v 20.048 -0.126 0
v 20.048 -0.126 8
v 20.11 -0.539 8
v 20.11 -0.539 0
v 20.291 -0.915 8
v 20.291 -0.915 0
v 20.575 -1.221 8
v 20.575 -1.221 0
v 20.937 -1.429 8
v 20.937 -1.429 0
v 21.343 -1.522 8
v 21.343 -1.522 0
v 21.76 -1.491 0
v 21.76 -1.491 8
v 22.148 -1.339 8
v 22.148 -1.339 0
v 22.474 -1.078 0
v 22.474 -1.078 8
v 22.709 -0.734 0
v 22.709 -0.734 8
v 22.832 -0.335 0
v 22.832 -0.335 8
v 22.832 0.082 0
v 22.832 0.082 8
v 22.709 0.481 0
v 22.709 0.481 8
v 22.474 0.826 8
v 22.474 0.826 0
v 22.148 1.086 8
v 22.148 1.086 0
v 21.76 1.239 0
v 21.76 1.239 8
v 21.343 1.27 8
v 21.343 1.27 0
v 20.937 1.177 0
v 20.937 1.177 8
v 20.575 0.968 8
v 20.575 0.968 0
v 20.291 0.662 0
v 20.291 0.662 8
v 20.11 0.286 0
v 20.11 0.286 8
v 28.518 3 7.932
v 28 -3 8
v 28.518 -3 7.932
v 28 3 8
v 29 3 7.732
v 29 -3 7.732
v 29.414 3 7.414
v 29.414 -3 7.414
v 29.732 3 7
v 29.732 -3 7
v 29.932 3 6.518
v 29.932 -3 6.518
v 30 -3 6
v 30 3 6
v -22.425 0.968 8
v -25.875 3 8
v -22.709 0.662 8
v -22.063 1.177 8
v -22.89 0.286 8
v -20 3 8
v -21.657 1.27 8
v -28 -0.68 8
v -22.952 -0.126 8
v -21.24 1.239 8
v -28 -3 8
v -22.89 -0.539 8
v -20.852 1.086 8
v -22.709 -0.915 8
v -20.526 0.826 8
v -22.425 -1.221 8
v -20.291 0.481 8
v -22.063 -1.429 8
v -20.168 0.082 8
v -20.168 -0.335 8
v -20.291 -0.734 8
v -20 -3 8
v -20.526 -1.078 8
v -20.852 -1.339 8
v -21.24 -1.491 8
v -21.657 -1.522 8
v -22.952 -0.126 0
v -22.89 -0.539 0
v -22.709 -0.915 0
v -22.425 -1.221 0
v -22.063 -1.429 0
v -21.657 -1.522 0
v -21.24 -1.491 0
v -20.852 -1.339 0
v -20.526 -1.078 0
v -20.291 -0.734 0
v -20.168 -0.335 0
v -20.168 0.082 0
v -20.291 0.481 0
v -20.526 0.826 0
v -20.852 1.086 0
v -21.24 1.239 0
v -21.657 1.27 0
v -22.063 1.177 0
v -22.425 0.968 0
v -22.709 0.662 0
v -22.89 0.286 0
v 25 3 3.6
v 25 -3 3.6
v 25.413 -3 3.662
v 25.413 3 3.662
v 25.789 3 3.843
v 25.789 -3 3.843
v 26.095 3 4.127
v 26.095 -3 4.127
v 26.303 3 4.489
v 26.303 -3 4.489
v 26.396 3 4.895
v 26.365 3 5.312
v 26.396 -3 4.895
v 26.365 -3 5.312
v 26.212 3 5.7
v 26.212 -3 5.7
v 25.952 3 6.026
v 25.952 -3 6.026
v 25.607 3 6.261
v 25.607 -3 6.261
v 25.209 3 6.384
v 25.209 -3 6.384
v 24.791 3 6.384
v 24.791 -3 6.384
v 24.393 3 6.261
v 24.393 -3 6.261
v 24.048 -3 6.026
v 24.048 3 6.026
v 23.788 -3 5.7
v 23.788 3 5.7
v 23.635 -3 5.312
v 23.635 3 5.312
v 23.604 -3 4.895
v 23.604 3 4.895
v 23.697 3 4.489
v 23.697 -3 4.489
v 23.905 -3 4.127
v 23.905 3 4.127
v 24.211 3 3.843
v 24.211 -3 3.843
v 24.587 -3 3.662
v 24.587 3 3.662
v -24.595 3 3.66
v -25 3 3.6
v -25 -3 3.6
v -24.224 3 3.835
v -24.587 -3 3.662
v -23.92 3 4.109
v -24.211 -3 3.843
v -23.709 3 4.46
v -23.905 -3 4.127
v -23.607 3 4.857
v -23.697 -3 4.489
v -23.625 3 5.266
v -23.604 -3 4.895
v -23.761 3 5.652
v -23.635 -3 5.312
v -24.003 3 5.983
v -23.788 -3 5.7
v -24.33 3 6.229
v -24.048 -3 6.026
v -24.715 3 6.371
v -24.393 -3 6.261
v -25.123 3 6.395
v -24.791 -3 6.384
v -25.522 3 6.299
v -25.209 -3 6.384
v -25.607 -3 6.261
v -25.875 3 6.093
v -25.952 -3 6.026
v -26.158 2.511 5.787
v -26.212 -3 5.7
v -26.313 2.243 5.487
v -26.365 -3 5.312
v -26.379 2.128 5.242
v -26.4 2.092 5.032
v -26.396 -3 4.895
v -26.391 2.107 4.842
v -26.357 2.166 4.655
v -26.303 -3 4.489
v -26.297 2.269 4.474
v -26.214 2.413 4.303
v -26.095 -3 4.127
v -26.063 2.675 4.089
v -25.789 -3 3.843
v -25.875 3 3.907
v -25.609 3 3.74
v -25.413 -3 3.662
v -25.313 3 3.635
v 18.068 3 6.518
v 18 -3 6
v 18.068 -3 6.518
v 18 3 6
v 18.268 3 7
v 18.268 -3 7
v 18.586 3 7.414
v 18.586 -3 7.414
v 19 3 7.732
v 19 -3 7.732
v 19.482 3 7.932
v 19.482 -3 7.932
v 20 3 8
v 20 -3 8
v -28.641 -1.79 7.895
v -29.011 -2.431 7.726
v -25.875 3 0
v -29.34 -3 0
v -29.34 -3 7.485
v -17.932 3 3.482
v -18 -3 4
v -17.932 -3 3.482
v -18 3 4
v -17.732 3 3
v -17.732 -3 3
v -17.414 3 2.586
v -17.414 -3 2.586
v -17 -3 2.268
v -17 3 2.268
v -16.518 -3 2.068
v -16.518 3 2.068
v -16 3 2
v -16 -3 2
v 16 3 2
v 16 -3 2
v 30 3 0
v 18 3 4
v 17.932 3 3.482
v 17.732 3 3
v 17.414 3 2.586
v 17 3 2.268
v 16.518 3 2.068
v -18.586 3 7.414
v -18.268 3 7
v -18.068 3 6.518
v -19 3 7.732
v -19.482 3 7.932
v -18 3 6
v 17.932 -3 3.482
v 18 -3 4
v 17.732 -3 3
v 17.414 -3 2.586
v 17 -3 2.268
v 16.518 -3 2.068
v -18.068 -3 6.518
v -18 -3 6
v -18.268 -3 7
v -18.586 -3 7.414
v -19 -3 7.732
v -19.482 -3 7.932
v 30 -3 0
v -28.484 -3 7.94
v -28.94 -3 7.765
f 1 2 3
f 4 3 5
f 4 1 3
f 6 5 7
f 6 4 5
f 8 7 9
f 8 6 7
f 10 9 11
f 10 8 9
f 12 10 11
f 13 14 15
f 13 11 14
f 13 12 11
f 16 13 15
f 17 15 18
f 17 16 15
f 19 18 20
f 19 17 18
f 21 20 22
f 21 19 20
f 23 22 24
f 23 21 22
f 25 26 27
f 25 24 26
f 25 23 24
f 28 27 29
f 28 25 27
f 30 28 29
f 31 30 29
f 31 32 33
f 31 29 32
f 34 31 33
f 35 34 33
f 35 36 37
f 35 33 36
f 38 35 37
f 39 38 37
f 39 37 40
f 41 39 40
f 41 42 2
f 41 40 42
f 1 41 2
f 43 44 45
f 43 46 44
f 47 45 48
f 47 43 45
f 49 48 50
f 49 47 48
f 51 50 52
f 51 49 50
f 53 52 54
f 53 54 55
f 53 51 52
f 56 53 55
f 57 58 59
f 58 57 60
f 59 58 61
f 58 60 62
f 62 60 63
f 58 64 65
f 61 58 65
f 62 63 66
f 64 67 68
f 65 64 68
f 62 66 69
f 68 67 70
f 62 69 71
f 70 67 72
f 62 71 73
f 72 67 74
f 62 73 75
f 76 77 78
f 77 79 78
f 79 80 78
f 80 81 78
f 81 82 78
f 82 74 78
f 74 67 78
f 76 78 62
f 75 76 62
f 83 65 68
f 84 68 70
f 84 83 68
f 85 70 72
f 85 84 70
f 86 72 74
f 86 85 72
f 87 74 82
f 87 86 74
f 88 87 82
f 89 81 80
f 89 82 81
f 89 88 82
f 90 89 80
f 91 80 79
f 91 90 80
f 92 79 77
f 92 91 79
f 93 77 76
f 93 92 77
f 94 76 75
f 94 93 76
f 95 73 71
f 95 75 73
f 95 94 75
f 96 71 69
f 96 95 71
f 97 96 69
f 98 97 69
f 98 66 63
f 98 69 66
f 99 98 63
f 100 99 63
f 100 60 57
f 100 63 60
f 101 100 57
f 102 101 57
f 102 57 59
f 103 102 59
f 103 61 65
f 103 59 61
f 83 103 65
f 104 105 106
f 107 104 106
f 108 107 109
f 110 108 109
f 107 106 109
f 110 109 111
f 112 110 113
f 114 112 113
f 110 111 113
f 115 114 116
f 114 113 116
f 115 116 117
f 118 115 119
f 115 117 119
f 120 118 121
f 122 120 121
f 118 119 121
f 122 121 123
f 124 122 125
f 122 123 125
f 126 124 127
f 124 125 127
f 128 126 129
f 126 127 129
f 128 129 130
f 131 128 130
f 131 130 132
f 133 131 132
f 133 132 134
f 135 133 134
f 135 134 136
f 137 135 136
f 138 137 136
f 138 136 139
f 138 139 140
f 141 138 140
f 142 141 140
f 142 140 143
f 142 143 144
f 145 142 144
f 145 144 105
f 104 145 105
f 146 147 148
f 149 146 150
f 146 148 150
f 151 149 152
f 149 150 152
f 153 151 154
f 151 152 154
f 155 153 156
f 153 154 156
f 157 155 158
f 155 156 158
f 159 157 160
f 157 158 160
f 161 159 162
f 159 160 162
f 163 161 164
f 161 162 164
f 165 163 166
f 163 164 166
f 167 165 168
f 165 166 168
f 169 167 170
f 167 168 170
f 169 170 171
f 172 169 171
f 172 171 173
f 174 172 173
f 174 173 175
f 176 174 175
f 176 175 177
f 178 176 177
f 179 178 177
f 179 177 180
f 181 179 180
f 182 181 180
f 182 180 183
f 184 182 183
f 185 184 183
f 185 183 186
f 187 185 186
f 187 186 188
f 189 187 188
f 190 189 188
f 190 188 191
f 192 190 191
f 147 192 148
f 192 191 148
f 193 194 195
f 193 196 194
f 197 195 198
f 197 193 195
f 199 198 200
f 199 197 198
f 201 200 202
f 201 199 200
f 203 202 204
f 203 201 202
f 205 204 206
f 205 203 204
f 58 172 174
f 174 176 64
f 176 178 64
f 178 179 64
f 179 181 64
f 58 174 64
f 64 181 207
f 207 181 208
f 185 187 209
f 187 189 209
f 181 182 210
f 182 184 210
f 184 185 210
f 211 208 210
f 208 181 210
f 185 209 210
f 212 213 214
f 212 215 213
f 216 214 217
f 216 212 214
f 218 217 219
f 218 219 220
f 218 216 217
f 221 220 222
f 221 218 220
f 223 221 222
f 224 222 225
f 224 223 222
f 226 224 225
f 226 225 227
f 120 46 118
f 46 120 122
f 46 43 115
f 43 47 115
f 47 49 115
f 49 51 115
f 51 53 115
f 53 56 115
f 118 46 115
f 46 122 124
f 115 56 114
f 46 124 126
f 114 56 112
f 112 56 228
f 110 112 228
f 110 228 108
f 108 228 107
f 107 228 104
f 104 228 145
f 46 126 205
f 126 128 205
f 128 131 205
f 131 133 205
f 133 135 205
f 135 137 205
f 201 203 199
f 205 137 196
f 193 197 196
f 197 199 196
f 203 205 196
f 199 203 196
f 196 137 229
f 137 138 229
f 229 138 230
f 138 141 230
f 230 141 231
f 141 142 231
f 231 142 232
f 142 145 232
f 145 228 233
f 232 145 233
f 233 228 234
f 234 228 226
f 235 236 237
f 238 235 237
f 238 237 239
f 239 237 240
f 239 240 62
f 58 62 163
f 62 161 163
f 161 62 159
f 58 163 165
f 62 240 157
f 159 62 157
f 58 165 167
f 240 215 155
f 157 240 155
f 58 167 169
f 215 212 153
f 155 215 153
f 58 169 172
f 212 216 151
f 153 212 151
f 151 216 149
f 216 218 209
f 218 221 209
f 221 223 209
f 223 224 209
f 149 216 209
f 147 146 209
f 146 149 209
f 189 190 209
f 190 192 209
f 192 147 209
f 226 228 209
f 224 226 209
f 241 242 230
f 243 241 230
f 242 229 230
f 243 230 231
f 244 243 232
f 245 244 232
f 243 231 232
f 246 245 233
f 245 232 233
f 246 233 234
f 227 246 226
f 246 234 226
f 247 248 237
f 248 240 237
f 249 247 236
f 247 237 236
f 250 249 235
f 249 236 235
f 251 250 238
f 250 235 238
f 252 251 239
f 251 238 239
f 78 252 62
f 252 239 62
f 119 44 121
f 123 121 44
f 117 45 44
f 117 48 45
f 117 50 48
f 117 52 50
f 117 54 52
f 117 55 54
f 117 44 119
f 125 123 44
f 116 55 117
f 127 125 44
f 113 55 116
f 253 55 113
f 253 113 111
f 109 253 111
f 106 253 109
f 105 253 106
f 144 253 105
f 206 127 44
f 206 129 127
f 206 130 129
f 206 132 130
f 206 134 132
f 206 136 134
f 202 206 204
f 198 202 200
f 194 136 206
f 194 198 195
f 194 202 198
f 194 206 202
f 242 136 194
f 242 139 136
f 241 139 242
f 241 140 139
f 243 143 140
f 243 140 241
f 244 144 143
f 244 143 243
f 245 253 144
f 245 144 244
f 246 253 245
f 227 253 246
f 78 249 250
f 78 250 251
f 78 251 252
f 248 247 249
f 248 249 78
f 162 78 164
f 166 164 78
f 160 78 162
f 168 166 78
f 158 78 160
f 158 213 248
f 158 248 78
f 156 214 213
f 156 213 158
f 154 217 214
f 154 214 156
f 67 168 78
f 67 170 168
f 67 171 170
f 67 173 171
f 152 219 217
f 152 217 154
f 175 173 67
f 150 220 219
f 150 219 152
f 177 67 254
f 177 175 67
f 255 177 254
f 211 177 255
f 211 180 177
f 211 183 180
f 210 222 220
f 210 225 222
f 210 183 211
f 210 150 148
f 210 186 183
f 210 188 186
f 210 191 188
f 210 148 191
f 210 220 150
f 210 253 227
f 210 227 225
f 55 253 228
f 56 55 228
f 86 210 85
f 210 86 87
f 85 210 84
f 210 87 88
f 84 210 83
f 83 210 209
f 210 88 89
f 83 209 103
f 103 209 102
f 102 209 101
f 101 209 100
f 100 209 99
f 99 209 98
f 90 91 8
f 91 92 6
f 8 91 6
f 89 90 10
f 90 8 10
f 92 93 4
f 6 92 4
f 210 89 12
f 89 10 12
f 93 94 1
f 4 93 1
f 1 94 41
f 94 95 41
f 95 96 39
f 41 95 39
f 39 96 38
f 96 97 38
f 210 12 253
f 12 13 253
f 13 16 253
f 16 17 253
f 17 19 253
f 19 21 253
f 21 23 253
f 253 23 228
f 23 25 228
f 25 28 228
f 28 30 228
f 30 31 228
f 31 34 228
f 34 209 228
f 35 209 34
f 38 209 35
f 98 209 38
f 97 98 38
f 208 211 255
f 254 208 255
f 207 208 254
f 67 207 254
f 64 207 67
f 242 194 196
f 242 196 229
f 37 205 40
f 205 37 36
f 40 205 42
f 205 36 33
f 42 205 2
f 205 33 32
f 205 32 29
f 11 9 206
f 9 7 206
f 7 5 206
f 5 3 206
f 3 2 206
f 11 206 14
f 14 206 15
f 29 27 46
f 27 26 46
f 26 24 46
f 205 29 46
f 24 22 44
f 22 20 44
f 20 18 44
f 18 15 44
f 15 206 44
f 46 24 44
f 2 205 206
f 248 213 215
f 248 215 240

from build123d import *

# Parameters (mm, degrees)
SKETCH1_W           = 60
SKETCH1_H           = 6
BASE_DEPTH          = 2
BOSS_EXTRUDE2_DEPTH = 6
FILLET1_R           = 2
CROP_REACH          = 33.193
FAN_SCREWS_REACH    = 33.623
SKETCH5_R           = 1.4
PCB_SCREWS_REACH    = 33.193
SKETCH3_R           = 1.4


with BuildPart() as part:
    # Sketch1 → Base (new body)
    with BuildSketch(Plane.XY):
        Rectangle(SKETCH1_W, SKETCH1_H)
    extrude(amount=BASE_DEPTH)

    # Sketch4 → Boss-Extrude2 (add)
    with BuildSketch(Plane(origin=(0, -3, 0), x_dir=(1, 0, 0), z_dir=(0, 1, 0))):
        Polygon((-30, -2), (-18, -2), (-18, -8), (-25, -8), (-30, -8), align=None)
        Polygon((30, -2), (30, -8), (25, -8), (18, -8), (18, -2), align=None)
    extrude(amount=BOSS_EXTRUDE2_DEPTH)

    # Fillet1
    fillet1_edges = [part.edges().sort_by_distance(p)[0] for p in [
        (-18, 0, 2),
        (-18, 0, 8),
        (-30, 0, 8),
        (30, 0, 8),
        (18, 0, 8),
        (18, 0, 2),
    ]]
    fillet(fillet1_edges, radius=FILLET1_R)

    # Sketch2 → Crop (cut, up to next)
    with BuildSketch(Plane.XY, mode=Mode.PRIVATE) as crop_sk1:
        Polygon((-25.875432474, 3), (-29.339534089, -3), (-30, -3), (-30, 3), align=None)
    crop_tool1 = extrude(crop_sk1.sketch, amount=CROP_REACH, mode=Mode.PRIVATE) & part.part
    add(crop_tool1.solids().sort_by_distance((-28.594757, 0.723945, 0))[0], mode=Mode.SUBTRACT)

    # Sketch5 → Fan screws (cut, up to next)
    with BuildSketch(Plane.XZ.offset(3), mode=Mode.PRIVATE) as fan_screws_sk1:
        with Locations(Location((25, 5, 0), (0, 0, 270))):
            Circle(SKETCH5_R)
    fan_screws_tool1 = extrude(fan_screws_sk1.sketch, amount=-FAN_SCREWS_REACH, mode=Mode.PRIVATE) & part.part
    # Sketch5 → Fan screws (cut, up to next)
    with BuildSketch(Plane.XZ.offset(3), mode=Mode.PRIVATE) as fan_screws_sk2:
        with Locations(Location((-25, 5, 0), (0, 0, 270))):
            Circle(SKETCH5_R)
    fan_screws_tool2 = extrude(fan_screws_sk2.sketch, amount=-FAN_SCREWS_REACH, mode=Mode.PRIVATE) & part.part
    add(fan_screws_tool1.solids().sort_by_distance((25, -3, 5))[0], mode=Mode.SUBTRACT)
    add(fan_screws_tool2.solids().sort_by_distance((-25, -3, 5))[0], mode=Mode.SUBTRACT)

    # Sketch3 → PCB screws (cut, up to next)
    with BuildSketch(Plane.XY, mode=Mode.PRIVATE) as pcb_screws_sk1:
        with Locations(Location((21.448, -0.1262, 0), (0, 0, 180))):
            Circle(SKETCH3_R)
    pcb_screws_tool1 = extrude(pcb_screws_sk1.sketch, amount=PCB_SCREWS_REACH, mode=Mode.PRIVATE) & part.part
    # Sketch3 → PCB screws (cut, up to next)
    with BuildSketch(Plane.XY, mode=Mode.PRIVATE) as pcb_screws_sk2:
        with Locations(Location((-21.552, -0.1262, 0), (0, 0, 180))):
            Circle(SKETCH3_R)
    pcb_screws_tool2 = extrude(pcb_screws_sk2.sketch, amount=PCB_SCREWS_REACH, mode=Mode.PRIVATE) & part.part
    add(pcb_screws_tool1.solids().sort_by_distance((21.448, -0.1262, 0))[0], mode=Mode.SUBTRACT)
    add(pcb_screws_tool2.solids().sort_by_distance((-21.552, -0.1262, 0))[0], mode=Mode.SUBTRACT)


solid = part.part
